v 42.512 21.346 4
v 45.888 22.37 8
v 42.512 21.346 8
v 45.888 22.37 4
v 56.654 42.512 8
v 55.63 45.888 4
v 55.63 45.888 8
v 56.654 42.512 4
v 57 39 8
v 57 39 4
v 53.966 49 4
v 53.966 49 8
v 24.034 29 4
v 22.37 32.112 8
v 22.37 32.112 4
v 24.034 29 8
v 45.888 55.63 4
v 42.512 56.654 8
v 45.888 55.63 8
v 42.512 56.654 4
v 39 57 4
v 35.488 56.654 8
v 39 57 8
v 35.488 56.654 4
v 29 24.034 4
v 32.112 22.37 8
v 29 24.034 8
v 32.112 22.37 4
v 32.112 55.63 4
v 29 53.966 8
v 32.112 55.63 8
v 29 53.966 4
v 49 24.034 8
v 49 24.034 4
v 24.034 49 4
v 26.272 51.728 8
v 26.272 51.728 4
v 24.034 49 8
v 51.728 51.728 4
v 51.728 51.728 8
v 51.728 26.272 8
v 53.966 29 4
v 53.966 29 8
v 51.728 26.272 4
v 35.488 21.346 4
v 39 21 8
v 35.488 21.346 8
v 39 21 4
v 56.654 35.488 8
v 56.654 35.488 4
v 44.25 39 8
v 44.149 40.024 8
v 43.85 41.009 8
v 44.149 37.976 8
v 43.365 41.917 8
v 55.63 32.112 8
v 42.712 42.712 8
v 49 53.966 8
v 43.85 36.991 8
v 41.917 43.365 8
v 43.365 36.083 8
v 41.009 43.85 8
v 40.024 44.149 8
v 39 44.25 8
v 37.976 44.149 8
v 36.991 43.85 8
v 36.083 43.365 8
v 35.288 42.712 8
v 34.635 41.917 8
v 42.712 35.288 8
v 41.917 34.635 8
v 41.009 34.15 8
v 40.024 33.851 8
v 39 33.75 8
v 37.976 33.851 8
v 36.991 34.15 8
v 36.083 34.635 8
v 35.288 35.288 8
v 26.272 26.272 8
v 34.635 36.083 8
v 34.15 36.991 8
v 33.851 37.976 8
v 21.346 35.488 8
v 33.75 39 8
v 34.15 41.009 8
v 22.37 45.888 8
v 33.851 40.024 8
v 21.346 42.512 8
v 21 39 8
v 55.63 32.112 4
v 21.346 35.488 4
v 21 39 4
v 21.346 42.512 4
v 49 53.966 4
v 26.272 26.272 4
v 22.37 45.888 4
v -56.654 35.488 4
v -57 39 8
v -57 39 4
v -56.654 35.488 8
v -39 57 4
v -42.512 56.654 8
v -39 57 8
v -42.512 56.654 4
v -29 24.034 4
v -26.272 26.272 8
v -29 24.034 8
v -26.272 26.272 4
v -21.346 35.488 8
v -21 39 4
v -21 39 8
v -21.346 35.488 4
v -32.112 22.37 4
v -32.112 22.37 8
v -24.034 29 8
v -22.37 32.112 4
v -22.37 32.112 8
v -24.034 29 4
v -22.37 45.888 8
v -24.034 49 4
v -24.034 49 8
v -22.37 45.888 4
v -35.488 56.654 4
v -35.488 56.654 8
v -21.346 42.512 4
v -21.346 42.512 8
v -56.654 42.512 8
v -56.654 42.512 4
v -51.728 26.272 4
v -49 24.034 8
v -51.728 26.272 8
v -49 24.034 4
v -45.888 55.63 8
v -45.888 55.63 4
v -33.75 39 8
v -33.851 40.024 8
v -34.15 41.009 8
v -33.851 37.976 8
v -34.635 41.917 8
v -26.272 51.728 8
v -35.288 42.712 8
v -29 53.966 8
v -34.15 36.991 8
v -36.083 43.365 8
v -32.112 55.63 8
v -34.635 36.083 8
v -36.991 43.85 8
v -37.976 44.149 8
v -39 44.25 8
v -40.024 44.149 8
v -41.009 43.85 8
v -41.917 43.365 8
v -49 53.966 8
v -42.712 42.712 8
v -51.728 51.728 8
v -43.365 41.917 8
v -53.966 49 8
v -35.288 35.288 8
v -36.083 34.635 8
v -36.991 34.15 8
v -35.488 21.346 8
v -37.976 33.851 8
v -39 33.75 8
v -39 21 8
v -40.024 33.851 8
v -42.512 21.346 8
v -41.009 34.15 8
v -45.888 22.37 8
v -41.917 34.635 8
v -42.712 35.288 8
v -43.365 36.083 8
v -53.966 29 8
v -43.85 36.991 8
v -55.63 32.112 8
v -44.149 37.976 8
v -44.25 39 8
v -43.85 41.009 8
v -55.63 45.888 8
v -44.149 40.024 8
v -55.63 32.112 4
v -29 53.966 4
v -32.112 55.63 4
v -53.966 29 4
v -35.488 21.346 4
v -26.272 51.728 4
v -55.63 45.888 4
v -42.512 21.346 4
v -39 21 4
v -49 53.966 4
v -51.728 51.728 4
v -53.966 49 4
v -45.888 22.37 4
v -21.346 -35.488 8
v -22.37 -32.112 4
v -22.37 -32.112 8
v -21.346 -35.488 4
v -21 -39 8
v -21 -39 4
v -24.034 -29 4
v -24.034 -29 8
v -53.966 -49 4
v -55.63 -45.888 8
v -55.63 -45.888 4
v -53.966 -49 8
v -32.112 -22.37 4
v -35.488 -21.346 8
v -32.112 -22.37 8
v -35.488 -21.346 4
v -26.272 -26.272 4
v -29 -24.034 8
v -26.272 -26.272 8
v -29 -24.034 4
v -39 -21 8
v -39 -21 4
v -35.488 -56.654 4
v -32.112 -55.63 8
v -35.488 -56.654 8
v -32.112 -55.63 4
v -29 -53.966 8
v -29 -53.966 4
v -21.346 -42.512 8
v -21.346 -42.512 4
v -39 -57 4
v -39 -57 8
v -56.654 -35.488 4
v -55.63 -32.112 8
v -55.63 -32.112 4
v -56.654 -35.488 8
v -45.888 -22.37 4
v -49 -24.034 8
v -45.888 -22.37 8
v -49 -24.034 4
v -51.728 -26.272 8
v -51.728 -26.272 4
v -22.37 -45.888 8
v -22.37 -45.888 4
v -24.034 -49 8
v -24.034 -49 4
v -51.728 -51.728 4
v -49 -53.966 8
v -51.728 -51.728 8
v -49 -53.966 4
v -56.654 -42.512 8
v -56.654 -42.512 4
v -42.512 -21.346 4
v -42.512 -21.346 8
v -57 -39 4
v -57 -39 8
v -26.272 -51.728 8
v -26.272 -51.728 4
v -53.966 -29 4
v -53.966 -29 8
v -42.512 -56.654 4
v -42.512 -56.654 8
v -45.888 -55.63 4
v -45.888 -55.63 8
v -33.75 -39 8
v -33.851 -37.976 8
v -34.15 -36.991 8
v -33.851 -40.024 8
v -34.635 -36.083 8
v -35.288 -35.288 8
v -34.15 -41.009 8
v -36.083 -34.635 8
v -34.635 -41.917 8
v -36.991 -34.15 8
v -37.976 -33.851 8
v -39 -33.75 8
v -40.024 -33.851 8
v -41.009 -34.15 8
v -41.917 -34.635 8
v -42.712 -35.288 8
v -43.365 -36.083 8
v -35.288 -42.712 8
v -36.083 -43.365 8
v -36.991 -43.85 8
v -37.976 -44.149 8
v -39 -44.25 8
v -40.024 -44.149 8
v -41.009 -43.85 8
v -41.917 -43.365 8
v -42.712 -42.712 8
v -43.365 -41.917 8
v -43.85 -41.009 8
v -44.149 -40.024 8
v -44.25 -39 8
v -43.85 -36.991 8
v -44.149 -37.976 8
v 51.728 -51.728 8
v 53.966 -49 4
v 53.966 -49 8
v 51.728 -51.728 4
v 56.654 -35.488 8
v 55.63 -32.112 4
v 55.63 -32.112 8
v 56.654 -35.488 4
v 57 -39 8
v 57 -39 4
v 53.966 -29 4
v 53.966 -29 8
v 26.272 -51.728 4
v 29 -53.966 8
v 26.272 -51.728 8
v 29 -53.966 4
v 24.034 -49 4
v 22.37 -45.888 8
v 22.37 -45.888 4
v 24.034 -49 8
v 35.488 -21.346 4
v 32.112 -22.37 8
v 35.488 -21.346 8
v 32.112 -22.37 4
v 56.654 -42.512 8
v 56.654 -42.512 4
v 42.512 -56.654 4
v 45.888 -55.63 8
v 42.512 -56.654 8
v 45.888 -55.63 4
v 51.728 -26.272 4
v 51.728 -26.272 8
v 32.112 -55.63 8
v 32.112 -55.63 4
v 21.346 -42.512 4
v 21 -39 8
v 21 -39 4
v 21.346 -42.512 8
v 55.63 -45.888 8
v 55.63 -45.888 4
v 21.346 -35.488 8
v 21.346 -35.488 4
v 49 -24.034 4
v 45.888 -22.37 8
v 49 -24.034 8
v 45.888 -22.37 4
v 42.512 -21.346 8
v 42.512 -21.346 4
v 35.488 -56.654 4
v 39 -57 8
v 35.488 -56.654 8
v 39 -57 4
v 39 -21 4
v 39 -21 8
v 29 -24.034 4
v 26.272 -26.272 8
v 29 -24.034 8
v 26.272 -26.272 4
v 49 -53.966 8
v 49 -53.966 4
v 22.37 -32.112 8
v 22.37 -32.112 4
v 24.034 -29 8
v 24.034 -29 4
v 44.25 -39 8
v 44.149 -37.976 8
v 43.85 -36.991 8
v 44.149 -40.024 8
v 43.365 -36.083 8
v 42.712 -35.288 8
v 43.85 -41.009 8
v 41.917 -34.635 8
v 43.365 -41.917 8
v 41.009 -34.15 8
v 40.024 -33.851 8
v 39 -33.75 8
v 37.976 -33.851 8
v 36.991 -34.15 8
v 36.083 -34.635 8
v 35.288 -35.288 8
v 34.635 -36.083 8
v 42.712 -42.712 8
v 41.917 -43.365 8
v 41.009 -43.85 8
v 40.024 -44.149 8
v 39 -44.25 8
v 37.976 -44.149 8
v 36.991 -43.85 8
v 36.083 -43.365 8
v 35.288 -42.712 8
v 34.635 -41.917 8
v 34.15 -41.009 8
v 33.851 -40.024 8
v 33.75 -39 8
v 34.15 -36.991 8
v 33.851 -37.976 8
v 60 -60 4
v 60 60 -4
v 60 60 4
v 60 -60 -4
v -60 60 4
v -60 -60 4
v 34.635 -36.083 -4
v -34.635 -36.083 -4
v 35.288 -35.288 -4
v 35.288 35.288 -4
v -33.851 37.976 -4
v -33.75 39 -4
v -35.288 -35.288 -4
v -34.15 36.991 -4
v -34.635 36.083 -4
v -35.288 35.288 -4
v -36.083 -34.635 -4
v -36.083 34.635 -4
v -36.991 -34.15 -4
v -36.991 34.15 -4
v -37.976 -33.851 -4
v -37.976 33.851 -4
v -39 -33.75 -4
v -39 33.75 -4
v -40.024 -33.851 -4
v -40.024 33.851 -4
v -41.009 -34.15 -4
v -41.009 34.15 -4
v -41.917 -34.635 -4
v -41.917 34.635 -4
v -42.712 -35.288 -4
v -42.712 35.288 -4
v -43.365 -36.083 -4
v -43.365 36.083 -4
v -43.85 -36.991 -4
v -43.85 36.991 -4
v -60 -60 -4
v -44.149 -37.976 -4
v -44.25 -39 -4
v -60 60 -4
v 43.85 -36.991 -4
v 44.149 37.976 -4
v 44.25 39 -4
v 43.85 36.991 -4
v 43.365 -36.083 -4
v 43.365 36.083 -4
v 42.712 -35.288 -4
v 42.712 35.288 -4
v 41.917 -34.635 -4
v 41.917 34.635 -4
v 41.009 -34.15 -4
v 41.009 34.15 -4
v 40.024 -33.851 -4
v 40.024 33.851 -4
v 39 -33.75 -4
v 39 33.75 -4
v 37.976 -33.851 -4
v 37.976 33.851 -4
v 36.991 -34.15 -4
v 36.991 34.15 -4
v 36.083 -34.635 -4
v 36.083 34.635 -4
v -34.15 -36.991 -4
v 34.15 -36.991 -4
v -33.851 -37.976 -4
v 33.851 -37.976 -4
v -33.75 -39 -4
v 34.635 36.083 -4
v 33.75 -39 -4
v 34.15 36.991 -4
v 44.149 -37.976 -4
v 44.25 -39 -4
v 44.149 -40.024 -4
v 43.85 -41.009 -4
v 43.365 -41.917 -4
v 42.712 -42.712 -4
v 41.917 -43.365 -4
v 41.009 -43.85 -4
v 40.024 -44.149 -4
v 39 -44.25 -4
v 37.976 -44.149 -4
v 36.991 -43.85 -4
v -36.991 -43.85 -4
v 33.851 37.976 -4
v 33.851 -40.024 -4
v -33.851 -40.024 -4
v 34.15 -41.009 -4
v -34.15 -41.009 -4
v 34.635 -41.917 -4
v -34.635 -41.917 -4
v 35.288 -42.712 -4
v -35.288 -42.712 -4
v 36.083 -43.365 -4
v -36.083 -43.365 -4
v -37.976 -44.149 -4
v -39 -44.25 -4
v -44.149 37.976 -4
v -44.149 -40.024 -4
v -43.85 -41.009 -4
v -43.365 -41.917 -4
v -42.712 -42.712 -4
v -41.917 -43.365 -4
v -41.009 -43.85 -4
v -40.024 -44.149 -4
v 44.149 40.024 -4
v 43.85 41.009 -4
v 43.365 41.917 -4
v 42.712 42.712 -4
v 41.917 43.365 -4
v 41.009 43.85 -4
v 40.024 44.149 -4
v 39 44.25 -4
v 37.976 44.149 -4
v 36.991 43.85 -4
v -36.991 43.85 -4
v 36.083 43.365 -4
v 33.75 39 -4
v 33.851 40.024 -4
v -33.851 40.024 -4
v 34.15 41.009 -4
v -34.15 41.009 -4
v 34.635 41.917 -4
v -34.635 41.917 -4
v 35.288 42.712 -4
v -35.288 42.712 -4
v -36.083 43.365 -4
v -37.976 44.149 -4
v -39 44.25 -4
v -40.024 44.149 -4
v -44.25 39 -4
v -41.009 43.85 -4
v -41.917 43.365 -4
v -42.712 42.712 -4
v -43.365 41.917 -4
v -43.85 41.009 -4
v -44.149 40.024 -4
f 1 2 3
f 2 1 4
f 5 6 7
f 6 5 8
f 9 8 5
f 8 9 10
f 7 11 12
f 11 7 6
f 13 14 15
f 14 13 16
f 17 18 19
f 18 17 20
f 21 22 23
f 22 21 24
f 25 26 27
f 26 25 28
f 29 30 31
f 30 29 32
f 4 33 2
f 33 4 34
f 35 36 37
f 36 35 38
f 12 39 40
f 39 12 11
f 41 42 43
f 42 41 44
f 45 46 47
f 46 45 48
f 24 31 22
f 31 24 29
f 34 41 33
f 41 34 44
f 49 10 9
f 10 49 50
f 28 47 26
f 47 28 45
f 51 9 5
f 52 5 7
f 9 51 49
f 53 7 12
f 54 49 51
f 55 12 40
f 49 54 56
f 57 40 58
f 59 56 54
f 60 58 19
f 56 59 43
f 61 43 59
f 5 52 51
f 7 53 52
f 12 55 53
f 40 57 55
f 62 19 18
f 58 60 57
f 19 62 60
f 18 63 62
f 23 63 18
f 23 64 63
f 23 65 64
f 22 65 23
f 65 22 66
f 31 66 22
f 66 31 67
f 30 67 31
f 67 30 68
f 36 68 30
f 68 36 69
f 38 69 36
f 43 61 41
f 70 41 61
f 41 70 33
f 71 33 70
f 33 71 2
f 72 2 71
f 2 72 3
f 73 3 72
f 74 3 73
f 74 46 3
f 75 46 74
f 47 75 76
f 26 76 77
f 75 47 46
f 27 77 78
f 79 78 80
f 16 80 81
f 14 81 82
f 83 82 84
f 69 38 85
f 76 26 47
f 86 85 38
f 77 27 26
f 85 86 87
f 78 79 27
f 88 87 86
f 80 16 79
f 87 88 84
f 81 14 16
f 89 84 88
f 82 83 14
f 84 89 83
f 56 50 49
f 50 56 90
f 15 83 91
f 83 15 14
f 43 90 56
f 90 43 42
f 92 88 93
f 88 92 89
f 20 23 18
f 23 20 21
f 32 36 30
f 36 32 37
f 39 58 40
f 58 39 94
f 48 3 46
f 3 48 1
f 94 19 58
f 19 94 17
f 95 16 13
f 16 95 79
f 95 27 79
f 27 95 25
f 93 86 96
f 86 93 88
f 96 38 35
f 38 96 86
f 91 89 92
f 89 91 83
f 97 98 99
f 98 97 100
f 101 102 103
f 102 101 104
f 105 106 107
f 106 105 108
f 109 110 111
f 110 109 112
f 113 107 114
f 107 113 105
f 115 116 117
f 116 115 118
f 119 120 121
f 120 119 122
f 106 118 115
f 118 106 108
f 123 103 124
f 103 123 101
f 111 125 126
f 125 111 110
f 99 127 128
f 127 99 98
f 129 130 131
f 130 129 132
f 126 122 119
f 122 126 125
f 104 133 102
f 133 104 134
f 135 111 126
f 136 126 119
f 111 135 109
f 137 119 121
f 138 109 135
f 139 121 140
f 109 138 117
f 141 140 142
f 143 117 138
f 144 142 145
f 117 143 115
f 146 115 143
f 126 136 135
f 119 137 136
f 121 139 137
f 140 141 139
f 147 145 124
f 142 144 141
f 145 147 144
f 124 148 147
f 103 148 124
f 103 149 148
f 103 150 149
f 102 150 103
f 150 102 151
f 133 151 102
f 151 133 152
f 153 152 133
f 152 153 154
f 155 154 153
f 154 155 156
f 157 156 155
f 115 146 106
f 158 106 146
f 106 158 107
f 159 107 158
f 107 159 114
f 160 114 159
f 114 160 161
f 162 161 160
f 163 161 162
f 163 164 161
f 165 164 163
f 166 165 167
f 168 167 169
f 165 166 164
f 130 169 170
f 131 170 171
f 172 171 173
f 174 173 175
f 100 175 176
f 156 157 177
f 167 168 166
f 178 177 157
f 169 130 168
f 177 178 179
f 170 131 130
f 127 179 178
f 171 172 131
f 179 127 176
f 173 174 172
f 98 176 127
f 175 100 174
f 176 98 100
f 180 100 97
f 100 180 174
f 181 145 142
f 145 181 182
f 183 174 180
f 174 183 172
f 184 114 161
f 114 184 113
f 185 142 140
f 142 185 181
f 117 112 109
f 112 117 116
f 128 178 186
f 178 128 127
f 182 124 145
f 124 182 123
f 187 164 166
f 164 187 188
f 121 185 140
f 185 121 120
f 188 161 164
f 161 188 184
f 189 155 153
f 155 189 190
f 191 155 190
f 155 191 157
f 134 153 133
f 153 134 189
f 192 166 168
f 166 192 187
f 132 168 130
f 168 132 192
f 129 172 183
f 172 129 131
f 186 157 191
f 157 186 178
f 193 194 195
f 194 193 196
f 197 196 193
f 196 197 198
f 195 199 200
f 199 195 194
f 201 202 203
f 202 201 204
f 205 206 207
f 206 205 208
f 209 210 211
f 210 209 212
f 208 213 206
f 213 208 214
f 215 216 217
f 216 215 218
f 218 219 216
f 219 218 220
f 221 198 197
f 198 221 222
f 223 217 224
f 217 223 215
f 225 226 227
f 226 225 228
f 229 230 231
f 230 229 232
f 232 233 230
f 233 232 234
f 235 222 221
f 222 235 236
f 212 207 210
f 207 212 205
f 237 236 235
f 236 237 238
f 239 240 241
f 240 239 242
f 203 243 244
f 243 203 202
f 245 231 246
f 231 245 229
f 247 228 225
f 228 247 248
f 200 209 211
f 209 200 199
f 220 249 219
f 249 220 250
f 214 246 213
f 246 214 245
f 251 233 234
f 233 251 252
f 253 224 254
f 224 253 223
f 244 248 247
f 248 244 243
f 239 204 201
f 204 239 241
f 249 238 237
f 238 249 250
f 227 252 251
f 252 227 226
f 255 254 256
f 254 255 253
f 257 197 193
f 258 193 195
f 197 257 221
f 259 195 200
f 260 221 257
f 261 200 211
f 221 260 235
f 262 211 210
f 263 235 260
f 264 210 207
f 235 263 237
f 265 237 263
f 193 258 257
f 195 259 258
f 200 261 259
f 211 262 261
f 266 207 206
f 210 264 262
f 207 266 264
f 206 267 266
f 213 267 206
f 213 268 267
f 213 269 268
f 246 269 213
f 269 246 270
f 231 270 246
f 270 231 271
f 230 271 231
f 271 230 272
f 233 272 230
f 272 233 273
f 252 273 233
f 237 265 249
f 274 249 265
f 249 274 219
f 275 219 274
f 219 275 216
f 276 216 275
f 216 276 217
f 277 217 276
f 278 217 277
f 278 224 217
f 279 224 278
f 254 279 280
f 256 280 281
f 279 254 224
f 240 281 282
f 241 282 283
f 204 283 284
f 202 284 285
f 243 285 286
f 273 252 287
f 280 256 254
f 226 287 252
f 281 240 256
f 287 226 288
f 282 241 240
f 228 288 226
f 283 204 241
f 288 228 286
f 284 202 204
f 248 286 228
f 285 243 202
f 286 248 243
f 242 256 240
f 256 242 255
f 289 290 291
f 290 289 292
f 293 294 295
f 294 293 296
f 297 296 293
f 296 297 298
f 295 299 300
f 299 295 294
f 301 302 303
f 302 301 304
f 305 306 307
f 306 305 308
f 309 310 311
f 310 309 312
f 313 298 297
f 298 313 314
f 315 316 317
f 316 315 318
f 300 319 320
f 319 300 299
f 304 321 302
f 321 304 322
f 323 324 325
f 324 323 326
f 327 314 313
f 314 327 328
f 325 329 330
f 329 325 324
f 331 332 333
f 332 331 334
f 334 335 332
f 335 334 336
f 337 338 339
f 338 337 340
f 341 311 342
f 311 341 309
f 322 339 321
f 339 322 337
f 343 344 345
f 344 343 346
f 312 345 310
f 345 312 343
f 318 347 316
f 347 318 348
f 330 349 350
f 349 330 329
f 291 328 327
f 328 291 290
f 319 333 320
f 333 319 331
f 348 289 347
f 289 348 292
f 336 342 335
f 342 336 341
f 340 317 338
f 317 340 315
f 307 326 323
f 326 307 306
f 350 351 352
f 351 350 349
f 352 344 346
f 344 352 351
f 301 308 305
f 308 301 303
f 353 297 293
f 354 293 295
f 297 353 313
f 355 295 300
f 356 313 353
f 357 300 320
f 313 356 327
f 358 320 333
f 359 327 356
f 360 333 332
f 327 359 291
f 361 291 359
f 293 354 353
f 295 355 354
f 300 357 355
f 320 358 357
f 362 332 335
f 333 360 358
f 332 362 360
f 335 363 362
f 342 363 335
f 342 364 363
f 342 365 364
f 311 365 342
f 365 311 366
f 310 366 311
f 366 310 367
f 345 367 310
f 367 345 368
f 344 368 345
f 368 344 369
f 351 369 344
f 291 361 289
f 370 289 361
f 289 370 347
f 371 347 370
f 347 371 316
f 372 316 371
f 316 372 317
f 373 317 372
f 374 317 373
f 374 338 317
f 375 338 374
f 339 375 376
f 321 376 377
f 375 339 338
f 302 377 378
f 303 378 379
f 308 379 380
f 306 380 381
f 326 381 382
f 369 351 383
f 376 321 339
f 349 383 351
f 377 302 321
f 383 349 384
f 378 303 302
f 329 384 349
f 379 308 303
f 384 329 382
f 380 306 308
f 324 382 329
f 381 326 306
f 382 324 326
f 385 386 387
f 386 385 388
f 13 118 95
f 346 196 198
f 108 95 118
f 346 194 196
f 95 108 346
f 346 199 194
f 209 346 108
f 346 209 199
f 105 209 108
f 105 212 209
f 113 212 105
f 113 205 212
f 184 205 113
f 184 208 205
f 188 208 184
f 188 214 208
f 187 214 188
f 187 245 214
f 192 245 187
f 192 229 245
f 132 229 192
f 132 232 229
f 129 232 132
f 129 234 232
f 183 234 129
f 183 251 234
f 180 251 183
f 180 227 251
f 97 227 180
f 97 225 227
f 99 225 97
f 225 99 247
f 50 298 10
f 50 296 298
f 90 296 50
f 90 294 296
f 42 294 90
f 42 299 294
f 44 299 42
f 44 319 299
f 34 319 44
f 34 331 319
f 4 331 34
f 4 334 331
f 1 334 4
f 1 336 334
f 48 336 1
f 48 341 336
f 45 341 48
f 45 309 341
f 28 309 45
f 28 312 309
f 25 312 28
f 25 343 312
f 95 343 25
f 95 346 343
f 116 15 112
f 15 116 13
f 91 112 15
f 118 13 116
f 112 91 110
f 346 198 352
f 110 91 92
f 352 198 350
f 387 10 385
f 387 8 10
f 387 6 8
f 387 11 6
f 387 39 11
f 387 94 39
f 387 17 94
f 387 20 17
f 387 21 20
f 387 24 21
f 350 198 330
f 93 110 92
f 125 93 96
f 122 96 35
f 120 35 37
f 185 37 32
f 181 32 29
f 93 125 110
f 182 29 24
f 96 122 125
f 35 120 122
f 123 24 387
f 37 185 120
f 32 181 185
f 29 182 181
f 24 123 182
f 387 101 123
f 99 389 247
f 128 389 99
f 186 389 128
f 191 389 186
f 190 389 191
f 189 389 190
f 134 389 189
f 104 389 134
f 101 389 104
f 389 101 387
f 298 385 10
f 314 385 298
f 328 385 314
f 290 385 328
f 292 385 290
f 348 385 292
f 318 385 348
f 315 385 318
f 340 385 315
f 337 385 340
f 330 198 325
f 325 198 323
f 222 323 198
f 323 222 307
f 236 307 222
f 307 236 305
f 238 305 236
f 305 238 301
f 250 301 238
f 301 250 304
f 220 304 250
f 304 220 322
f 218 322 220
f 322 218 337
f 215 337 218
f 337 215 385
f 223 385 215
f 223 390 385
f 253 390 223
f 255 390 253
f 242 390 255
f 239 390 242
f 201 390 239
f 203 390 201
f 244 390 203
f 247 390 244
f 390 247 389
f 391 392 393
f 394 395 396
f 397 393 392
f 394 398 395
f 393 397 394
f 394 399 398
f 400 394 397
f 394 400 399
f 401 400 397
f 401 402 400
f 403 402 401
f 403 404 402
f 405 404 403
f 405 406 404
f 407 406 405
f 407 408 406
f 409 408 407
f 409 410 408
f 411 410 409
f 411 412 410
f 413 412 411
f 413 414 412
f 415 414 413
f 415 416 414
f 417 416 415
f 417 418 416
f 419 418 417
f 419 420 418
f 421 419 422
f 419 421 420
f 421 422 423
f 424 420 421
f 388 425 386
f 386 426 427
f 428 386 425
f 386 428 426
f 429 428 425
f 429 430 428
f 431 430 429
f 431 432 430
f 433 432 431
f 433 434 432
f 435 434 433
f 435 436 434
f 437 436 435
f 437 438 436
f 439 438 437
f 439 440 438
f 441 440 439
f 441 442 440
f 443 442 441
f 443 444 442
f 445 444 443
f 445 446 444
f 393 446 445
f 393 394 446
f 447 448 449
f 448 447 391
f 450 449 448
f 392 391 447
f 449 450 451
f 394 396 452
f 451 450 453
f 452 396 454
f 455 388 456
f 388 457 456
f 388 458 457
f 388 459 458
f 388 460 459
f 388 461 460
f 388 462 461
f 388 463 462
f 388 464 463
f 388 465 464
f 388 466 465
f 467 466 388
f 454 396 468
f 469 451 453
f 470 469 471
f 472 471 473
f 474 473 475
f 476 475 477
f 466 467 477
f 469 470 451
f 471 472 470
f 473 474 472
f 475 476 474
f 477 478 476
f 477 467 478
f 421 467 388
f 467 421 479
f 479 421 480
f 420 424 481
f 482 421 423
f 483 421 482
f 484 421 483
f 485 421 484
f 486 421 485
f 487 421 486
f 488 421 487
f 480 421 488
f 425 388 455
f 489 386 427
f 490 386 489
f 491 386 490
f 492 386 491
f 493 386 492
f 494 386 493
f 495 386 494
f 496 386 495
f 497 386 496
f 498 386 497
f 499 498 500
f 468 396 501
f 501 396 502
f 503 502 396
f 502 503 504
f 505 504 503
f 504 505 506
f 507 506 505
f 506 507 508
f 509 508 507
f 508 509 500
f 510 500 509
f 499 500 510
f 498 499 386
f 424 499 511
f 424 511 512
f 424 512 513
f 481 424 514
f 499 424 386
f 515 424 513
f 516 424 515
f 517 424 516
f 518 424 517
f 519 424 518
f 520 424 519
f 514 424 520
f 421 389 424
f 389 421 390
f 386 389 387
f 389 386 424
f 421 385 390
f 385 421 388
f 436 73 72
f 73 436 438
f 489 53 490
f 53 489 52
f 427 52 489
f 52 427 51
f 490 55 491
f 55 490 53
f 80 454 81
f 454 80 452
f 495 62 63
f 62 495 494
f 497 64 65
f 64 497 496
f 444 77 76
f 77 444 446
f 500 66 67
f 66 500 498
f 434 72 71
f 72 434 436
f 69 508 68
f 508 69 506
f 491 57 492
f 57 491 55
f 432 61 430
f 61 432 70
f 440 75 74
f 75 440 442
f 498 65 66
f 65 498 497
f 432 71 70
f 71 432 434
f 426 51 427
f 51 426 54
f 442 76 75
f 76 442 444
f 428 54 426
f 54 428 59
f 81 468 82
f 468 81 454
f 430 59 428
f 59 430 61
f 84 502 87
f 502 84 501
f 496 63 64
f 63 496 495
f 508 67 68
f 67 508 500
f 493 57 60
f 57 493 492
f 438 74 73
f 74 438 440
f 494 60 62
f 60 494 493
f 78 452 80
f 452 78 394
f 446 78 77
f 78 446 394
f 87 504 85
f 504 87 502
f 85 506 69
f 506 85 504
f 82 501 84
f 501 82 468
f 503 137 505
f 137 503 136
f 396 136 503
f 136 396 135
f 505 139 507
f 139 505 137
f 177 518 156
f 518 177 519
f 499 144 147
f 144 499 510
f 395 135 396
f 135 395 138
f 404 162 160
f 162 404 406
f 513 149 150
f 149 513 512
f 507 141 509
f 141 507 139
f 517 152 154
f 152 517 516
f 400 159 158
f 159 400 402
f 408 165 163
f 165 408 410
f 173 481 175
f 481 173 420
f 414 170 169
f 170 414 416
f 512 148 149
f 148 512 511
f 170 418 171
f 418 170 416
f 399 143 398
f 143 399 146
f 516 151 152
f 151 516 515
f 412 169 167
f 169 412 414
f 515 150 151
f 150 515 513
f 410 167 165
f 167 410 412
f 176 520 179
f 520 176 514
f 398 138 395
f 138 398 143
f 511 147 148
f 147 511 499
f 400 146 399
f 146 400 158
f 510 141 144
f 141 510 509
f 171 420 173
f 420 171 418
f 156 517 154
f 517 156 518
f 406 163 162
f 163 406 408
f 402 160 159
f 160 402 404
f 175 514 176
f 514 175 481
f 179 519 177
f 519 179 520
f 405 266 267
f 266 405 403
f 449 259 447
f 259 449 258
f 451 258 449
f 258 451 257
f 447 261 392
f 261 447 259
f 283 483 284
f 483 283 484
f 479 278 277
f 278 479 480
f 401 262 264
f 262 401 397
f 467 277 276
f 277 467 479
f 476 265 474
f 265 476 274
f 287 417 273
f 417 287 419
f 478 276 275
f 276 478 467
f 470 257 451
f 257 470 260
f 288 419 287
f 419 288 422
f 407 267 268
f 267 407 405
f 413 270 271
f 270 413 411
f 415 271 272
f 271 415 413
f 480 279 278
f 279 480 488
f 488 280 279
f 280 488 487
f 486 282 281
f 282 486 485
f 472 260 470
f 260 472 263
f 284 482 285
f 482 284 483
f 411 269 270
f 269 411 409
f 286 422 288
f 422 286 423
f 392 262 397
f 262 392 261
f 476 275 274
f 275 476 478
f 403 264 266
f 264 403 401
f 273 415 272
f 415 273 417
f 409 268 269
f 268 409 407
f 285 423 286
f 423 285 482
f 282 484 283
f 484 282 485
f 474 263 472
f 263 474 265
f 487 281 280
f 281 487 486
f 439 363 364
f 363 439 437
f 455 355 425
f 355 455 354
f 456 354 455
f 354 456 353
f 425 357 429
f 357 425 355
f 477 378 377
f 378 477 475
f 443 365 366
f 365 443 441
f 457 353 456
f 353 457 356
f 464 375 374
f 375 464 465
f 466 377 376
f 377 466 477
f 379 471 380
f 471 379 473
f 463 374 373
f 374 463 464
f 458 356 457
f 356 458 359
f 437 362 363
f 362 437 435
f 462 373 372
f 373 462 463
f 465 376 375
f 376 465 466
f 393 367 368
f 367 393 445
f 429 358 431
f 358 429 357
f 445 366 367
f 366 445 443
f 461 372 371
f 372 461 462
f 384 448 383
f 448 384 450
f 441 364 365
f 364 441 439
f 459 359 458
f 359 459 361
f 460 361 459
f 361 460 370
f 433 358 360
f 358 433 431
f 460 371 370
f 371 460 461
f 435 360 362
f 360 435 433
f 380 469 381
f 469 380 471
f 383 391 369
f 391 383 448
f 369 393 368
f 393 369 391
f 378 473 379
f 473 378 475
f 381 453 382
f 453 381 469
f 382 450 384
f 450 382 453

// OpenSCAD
$fn = 32;

// ----------------------------------------------------------------------
// Anchor pads 120 x 120 x 12
// four corner bosses with anchor holes
// ----------------------------------------------------------------------

// --- parameters (mm) ---
plate = [120, 120, 8];  // base plate size (x, y, z)
pads = 4;               // boss count, one per corner
edge = 21;              // boss centre offset from the plate edge
boss_d = 36;            // boss diameter
boss_h = 4;             // boss height above the base plate
hole_d = 10.5;          // hole diameter

// --- derived feature positions (mm) ---
height = plate[2] + boss_h;      // = 12   overall height of the part
corner_x = plate[0] / 2 - edge;  // = 39   boss centre X
corner_y = plate[1] / 2 - edge;  // = 39   boss centre Y
feature_centers = [
  [corner_x, corner_y],
  [-corner_x, corner_y],
  [-corner_x, -corner_y],
  [corner_x, -corner_y]
];   // boss centres, anchor holes are drilled there

// base plate, four bosses standing on it, anchor holes all the way through
difference() {
  union() {
    cube(plate, center = true);
    for (centre = feature_centers)
      translate([centre[0], centre[1], plate[2] / 2 - 1])
        cylinder(d = boss_d, h = boss_h + 1);
  }
  for (centre = feature_centers)
    translate([centre[0], centre[1], -height])
      cylinder(d = hole_d, h = 2 * height + 2);  // through boss and plate
}
